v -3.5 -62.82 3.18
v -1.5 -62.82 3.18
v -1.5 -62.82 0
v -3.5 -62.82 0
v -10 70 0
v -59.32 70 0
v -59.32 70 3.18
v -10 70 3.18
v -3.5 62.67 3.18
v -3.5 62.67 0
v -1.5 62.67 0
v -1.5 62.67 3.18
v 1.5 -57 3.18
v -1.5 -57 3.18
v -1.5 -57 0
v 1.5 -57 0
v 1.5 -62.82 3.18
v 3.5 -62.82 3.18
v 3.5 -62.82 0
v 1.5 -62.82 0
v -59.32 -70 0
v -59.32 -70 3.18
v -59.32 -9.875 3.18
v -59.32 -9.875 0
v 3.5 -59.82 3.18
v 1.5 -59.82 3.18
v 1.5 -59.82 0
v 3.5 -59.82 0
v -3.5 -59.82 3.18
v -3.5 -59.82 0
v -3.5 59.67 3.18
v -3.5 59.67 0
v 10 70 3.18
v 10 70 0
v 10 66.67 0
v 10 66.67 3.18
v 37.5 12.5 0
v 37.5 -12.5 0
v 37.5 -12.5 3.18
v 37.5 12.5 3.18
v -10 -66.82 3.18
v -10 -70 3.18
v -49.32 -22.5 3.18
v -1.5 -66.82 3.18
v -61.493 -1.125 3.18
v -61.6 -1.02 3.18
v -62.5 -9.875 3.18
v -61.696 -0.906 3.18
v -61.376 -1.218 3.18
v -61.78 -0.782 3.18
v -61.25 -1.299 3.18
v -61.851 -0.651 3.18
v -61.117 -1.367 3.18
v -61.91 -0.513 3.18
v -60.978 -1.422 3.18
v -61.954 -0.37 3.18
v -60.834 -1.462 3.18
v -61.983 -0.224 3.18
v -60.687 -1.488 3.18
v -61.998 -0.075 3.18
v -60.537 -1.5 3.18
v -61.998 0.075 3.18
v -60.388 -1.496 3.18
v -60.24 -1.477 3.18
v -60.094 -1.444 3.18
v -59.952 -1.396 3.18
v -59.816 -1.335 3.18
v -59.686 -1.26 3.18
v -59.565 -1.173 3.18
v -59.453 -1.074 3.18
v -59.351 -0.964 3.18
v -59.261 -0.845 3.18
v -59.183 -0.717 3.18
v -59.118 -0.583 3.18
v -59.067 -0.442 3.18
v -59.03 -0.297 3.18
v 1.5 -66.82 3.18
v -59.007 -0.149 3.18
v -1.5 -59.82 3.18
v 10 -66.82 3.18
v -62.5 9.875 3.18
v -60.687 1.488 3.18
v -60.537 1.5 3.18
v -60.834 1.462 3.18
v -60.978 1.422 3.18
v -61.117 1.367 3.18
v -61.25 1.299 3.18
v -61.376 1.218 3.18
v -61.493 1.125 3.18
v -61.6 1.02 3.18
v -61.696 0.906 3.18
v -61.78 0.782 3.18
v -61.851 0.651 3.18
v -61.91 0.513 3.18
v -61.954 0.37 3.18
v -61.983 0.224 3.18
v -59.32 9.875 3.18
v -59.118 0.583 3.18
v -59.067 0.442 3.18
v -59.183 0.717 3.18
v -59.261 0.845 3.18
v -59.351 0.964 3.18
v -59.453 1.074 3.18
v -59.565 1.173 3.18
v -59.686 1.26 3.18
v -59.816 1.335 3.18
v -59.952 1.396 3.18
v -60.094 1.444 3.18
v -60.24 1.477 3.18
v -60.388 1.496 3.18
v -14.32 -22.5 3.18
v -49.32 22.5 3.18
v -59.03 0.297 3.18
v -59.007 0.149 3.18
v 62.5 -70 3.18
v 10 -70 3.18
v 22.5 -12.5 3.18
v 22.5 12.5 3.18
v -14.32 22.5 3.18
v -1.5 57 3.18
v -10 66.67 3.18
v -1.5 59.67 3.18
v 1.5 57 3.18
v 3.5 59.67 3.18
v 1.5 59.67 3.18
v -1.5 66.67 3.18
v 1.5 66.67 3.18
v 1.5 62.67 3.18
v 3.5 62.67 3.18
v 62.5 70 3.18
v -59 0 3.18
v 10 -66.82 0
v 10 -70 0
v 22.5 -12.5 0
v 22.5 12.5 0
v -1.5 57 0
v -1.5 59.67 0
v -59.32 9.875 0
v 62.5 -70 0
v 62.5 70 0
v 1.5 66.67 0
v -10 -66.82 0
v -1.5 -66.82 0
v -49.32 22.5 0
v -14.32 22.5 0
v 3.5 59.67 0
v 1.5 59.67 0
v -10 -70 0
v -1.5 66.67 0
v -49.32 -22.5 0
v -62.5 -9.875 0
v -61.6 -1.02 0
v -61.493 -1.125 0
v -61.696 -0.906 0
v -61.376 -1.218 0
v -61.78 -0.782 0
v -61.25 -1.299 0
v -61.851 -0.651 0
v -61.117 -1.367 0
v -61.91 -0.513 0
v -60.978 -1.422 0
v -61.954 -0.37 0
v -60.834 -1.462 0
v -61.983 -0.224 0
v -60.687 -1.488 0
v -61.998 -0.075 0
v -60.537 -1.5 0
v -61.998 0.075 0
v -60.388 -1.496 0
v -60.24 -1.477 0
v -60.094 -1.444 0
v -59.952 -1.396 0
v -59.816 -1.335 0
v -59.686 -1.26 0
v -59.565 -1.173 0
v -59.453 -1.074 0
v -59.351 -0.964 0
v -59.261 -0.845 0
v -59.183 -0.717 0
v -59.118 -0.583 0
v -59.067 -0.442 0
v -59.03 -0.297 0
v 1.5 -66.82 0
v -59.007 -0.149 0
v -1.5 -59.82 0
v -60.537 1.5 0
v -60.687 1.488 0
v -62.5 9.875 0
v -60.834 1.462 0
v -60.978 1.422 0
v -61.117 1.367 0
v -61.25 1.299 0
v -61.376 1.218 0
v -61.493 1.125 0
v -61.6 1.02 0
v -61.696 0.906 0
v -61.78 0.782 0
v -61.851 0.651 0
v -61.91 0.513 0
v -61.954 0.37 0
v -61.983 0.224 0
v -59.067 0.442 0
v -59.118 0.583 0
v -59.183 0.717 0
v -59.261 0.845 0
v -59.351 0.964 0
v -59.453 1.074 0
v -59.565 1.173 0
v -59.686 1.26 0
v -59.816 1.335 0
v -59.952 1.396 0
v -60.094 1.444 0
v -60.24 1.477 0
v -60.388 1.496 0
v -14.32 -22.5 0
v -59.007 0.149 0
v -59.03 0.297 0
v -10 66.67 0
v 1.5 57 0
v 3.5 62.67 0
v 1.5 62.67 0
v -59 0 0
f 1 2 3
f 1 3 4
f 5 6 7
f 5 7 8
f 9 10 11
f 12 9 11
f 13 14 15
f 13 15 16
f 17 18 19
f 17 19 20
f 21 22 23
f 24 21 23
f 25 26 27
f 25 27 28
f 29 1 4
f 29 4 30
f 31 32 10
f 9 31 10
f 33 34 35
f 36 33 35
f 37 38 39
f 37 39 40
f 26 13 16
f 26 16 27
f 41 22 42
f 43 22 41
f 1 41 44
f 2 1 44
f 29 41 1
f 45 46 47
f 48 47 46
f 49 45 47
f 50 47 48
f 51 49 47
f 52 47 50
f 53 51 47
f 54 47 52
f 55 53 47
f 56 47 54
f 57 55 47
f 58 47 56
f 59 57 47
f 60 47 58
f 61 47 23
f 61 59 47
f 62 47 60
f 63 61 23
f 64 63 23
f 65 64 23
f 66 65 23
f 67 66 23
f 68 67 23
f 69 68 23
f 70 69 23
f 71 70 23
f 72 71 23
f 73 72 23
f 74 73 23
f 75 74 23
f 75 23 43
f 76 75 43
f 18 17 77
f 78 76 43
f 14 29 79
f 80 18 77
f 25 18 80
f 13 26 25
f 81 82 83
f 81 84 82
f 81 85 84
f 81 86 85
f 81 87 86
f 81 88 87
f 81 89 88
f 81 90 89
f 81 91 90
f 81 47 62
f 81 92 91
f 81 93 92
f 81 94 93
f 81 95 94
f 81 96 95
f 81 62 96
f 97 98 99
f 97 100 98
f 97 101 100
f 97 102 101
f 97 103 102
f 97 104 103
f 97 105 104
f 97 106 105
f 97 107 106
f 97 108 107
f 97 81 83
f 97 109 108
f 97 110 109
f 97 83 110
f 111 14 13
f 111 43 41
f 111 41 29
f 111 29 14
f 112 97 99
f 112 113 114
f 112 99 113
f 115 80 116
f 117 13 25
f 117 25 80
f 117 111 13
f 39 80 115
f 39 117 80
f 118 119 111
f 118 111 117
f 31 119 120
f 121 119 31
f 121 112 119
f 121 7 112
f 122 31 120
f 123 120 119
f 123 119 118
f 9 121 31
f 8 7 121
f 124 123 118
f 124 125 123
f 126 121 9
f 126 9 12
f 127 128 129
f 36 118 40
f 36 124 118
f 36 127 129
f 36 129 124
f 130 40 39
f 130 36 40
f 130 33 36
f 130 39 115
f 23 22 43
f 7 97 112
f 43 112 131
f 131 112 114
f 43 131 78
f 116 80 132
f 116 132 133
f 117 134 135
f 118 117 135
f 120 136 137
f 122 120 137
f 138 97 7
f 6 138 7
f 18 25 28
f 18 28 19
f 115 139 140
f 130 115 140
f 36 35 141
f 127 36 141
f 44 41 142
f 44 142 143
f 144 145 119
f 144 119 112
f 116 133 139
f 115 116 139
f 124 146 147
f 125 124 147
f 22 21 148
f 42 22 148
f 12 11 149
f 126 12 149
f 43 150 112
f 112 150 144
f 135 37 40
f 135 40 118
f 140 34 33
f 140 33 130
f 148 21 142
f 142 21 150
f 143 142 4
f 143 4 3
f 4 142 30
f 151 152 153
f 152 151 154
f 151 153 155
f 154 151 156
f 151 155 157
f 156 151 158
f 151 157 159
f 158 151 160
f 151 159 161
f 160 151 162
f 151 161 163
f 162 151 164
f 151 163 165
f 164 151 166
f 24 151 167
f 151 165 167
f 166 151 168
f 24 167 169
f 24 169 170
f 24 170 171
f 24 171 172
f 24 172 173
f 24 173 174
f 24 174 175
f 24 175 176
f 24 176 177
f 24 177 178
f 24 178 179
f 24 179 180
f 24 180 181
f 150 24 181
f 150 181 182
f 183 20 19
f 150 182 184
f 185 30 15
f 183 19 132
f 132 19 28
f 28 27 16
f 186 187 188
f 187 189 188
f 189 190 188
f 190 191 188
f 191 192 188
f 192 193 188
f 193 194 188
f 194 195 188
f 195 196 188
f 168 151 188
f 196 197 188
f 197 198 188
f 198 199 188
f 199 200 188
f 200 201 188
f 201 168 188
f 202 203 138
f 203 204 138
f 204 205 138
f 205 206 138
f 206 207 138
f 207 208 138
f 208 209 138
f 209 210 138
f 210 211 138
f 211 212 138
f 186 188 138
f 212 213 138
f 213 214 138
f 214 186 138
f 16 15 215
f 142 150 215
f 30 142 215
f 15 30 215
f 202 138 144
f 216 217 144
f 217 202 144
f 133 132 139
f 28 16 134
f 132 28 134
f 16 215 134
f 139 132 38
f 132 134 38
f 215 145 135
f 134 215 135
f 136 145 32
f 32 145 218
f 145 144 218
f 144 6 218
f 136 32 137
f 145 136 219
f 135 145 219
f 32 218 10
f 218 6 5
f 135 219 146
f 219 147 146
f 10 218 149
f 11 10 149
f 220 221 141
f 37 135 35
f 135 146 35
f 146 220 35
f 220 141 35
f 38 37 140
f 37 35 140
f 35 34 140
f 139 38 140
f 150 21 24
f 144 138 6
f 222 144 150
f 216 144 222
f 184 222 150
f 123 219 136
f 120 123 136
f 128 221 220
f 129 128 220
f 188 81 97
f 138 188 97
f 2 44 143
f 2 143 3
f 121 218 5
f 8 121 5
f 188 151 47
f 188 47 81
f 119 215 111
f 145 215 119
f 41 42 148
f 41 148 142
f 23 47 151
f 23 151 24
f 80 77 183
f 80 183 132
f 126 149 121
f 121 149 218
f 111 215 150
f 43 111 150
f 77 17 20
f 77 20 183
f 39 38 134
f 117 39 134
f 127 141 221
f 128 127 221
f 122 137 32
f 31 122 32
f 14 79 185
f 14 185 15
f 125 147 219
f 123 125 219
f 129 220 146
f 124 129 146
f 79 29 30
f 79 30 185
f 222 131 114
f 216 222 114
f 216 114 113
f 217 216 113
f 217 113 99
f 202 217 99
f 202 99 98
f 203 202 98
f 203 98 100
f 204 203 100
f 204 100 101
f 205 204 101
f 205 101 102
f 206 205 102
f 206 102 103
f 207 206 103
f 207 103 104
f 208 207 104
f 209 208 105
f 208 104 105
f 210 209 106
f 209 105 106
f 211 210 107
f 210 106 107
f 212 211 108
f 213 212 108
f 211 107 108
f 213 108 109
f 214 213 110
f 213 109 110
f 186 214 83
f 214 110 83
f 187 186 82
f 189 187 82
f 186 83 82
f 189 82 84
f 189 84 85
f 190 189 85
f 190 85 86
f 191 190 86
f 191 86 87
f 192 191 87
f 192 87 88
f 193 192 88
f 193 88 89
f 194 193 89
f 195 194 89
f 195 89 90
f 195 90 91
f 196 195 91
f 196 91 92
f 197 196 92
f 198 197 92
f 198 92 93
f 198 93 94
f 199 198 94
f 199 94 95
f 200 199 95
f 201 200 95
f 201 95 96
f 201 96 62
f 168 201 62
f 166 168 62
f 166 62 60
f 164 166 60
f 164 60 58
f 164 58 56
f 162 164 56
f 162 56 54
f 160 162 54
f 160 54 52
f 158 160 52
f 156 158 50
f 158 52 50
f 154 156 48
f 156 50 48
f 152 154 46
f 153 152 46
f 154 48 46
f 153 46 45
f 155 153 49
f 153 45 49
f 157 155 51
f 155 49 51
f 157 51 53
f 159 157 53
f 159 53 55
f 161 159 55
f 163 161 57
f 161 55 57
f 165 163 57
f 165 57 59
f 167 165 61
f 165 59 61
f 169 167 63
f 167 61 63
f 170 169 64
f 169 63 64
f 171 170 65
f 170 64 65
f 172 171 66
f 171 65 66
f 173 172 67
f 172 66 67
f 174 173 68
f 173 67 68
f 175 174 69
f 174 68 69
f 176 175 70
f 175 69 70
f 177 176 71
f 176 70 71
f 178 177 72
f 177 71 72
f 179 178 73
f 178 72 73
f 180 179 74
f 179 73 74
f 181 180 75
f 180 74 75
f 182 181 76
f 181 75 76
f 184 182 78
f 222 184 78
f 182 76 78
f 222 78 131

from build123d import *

# Parameters (mm, degrees)
SKETCH1_W           = 125
SKETCH1_H           = 140
BOSS_EXTRUDE1_DEPTH = 3.18
SKETCH2_R           = 1.5
SKETCH2_W           = 3.18
SKETCH2_H           = 60.125
SKETCH2_W_2         = 21.82
SKETCH2_H_2         = 64.054089404
SKETCH2_H_3         = 65
CUT_EXTRUDE1_DEPTH  = 4.18
SKETCH12_W          = 35
SKETCH12_H          = 45
CUT_EXTRUDE6_DEPTH  = 4.18
SKETCH13_W          = 15
SKETCH13_H          = 25
CUT_EXTRUDE7_DEPTH  = 4.18
CUT_EXTRUDE11_DEPTH = 10


with BuildPart() as part:
    # Sketch1 → Boss-Extrude1 (new body)
    with BuildSketch(Plane.XY):
        Rectangle(SKETCH1_W, SKETCH1_H)
    extrude(amount=BOSS_EXTRUDE1_DEPTH)

    # Sketch2 → Cut-Extrude1 (cut, through all)
    with BuildSketch(Plane.XY.offset(3.18)):
        with Locations((-60.5, 0)):
            Circle(SKETCH2_R)
        with Locations((85.5, 0)):
            Circle(SKETCH2_R)
        with Locations((-60.91, 39.9375)):
            Rectangle(SKETCH2_W, SKETCH2_H)
        with Locations((-60.91, -39.9375)):
            Rectangle(SKETCH2_W, SKETCH2_H)
        with Locations((73.41, -41.902044702)):
            Rectangle(SKETCH2_W_2, SKETCH2_H_2)
        with Locations((73.41, 42.625)):
            Rectangle(SKETCH2_W_2, SKETCH2_H_3)
        Polygon((1.5, -66.82), (10, -66.82), (10, -70), (-10, -70), (-10, -66.82), (-1.5, -66.82), (-1.5, -62.82), (-3.5, -62.82), (-3.5, -59.82), (-1.5, -59.82), (-1.5, -57), (1.5, -57), (1.5, -59.82), (3.5, -59.82), (3.5, -62.82), (1.5, -62.82), align=None)
    extrude(amount=-CUT_EXTRUDE1_DEPTH, mode=Mode.SUBTRACT)

    # Sketch12 → Cut-Extrude6 (cut, through all)
    with BuildSketch(Plane(origin=(0, 0, 0), x_dir=(-1, 0, 0), z_dir=(0, 0, -1))):
        with Locations((31.82, 0)):
            Rectangle(SKETCH12_W, SKETCH12_H)
    extrude(amount=-CUT_EXTRUDE6_DEPTH, mode=Mode.SUBTRACT)

    # Sketch13 → Cut-Extrude7 (cut, through all)
    with BuildSketch(Plane(origin=(0, 0, 0), x_dir=(-1, 0, 0), z_dir=(0, 0, -1))):
        with Locations((-30, 0)):
            Rectangle(SKETCH13_W, SKETCH13_H)
    extrude(amount=-CUT_EXTRUDE7_DEPTH, mode=Mode.SUBTRACT)

    # Sketch11 → Cut-Extrude11 (cut)
    with BuildSketch(Plane(origin=(0, 0, 0), x_dir=(-1, 0, 0), z_dir=(0, 0, -1))):
        Polygon((-10, 66.67), (-1.5, 66.67), (-1.5, 62.67), (-3.5, 62.67), (-3.5, 59.67), (-1.5, 59.67), (-1.5, 57), (1.5, 57), (1.5, 59.67), (3.5, 59.67), (3.5, 62.67), (1.5, 62.67), (1.5, 66.67), (10, 66.67), (10, 70), (-10, 70), align=None)
    extrude(amount=-CUT_EXTRUDE11_DEPTH, mode=Mode.SUBTRACT)


solid = part.part
